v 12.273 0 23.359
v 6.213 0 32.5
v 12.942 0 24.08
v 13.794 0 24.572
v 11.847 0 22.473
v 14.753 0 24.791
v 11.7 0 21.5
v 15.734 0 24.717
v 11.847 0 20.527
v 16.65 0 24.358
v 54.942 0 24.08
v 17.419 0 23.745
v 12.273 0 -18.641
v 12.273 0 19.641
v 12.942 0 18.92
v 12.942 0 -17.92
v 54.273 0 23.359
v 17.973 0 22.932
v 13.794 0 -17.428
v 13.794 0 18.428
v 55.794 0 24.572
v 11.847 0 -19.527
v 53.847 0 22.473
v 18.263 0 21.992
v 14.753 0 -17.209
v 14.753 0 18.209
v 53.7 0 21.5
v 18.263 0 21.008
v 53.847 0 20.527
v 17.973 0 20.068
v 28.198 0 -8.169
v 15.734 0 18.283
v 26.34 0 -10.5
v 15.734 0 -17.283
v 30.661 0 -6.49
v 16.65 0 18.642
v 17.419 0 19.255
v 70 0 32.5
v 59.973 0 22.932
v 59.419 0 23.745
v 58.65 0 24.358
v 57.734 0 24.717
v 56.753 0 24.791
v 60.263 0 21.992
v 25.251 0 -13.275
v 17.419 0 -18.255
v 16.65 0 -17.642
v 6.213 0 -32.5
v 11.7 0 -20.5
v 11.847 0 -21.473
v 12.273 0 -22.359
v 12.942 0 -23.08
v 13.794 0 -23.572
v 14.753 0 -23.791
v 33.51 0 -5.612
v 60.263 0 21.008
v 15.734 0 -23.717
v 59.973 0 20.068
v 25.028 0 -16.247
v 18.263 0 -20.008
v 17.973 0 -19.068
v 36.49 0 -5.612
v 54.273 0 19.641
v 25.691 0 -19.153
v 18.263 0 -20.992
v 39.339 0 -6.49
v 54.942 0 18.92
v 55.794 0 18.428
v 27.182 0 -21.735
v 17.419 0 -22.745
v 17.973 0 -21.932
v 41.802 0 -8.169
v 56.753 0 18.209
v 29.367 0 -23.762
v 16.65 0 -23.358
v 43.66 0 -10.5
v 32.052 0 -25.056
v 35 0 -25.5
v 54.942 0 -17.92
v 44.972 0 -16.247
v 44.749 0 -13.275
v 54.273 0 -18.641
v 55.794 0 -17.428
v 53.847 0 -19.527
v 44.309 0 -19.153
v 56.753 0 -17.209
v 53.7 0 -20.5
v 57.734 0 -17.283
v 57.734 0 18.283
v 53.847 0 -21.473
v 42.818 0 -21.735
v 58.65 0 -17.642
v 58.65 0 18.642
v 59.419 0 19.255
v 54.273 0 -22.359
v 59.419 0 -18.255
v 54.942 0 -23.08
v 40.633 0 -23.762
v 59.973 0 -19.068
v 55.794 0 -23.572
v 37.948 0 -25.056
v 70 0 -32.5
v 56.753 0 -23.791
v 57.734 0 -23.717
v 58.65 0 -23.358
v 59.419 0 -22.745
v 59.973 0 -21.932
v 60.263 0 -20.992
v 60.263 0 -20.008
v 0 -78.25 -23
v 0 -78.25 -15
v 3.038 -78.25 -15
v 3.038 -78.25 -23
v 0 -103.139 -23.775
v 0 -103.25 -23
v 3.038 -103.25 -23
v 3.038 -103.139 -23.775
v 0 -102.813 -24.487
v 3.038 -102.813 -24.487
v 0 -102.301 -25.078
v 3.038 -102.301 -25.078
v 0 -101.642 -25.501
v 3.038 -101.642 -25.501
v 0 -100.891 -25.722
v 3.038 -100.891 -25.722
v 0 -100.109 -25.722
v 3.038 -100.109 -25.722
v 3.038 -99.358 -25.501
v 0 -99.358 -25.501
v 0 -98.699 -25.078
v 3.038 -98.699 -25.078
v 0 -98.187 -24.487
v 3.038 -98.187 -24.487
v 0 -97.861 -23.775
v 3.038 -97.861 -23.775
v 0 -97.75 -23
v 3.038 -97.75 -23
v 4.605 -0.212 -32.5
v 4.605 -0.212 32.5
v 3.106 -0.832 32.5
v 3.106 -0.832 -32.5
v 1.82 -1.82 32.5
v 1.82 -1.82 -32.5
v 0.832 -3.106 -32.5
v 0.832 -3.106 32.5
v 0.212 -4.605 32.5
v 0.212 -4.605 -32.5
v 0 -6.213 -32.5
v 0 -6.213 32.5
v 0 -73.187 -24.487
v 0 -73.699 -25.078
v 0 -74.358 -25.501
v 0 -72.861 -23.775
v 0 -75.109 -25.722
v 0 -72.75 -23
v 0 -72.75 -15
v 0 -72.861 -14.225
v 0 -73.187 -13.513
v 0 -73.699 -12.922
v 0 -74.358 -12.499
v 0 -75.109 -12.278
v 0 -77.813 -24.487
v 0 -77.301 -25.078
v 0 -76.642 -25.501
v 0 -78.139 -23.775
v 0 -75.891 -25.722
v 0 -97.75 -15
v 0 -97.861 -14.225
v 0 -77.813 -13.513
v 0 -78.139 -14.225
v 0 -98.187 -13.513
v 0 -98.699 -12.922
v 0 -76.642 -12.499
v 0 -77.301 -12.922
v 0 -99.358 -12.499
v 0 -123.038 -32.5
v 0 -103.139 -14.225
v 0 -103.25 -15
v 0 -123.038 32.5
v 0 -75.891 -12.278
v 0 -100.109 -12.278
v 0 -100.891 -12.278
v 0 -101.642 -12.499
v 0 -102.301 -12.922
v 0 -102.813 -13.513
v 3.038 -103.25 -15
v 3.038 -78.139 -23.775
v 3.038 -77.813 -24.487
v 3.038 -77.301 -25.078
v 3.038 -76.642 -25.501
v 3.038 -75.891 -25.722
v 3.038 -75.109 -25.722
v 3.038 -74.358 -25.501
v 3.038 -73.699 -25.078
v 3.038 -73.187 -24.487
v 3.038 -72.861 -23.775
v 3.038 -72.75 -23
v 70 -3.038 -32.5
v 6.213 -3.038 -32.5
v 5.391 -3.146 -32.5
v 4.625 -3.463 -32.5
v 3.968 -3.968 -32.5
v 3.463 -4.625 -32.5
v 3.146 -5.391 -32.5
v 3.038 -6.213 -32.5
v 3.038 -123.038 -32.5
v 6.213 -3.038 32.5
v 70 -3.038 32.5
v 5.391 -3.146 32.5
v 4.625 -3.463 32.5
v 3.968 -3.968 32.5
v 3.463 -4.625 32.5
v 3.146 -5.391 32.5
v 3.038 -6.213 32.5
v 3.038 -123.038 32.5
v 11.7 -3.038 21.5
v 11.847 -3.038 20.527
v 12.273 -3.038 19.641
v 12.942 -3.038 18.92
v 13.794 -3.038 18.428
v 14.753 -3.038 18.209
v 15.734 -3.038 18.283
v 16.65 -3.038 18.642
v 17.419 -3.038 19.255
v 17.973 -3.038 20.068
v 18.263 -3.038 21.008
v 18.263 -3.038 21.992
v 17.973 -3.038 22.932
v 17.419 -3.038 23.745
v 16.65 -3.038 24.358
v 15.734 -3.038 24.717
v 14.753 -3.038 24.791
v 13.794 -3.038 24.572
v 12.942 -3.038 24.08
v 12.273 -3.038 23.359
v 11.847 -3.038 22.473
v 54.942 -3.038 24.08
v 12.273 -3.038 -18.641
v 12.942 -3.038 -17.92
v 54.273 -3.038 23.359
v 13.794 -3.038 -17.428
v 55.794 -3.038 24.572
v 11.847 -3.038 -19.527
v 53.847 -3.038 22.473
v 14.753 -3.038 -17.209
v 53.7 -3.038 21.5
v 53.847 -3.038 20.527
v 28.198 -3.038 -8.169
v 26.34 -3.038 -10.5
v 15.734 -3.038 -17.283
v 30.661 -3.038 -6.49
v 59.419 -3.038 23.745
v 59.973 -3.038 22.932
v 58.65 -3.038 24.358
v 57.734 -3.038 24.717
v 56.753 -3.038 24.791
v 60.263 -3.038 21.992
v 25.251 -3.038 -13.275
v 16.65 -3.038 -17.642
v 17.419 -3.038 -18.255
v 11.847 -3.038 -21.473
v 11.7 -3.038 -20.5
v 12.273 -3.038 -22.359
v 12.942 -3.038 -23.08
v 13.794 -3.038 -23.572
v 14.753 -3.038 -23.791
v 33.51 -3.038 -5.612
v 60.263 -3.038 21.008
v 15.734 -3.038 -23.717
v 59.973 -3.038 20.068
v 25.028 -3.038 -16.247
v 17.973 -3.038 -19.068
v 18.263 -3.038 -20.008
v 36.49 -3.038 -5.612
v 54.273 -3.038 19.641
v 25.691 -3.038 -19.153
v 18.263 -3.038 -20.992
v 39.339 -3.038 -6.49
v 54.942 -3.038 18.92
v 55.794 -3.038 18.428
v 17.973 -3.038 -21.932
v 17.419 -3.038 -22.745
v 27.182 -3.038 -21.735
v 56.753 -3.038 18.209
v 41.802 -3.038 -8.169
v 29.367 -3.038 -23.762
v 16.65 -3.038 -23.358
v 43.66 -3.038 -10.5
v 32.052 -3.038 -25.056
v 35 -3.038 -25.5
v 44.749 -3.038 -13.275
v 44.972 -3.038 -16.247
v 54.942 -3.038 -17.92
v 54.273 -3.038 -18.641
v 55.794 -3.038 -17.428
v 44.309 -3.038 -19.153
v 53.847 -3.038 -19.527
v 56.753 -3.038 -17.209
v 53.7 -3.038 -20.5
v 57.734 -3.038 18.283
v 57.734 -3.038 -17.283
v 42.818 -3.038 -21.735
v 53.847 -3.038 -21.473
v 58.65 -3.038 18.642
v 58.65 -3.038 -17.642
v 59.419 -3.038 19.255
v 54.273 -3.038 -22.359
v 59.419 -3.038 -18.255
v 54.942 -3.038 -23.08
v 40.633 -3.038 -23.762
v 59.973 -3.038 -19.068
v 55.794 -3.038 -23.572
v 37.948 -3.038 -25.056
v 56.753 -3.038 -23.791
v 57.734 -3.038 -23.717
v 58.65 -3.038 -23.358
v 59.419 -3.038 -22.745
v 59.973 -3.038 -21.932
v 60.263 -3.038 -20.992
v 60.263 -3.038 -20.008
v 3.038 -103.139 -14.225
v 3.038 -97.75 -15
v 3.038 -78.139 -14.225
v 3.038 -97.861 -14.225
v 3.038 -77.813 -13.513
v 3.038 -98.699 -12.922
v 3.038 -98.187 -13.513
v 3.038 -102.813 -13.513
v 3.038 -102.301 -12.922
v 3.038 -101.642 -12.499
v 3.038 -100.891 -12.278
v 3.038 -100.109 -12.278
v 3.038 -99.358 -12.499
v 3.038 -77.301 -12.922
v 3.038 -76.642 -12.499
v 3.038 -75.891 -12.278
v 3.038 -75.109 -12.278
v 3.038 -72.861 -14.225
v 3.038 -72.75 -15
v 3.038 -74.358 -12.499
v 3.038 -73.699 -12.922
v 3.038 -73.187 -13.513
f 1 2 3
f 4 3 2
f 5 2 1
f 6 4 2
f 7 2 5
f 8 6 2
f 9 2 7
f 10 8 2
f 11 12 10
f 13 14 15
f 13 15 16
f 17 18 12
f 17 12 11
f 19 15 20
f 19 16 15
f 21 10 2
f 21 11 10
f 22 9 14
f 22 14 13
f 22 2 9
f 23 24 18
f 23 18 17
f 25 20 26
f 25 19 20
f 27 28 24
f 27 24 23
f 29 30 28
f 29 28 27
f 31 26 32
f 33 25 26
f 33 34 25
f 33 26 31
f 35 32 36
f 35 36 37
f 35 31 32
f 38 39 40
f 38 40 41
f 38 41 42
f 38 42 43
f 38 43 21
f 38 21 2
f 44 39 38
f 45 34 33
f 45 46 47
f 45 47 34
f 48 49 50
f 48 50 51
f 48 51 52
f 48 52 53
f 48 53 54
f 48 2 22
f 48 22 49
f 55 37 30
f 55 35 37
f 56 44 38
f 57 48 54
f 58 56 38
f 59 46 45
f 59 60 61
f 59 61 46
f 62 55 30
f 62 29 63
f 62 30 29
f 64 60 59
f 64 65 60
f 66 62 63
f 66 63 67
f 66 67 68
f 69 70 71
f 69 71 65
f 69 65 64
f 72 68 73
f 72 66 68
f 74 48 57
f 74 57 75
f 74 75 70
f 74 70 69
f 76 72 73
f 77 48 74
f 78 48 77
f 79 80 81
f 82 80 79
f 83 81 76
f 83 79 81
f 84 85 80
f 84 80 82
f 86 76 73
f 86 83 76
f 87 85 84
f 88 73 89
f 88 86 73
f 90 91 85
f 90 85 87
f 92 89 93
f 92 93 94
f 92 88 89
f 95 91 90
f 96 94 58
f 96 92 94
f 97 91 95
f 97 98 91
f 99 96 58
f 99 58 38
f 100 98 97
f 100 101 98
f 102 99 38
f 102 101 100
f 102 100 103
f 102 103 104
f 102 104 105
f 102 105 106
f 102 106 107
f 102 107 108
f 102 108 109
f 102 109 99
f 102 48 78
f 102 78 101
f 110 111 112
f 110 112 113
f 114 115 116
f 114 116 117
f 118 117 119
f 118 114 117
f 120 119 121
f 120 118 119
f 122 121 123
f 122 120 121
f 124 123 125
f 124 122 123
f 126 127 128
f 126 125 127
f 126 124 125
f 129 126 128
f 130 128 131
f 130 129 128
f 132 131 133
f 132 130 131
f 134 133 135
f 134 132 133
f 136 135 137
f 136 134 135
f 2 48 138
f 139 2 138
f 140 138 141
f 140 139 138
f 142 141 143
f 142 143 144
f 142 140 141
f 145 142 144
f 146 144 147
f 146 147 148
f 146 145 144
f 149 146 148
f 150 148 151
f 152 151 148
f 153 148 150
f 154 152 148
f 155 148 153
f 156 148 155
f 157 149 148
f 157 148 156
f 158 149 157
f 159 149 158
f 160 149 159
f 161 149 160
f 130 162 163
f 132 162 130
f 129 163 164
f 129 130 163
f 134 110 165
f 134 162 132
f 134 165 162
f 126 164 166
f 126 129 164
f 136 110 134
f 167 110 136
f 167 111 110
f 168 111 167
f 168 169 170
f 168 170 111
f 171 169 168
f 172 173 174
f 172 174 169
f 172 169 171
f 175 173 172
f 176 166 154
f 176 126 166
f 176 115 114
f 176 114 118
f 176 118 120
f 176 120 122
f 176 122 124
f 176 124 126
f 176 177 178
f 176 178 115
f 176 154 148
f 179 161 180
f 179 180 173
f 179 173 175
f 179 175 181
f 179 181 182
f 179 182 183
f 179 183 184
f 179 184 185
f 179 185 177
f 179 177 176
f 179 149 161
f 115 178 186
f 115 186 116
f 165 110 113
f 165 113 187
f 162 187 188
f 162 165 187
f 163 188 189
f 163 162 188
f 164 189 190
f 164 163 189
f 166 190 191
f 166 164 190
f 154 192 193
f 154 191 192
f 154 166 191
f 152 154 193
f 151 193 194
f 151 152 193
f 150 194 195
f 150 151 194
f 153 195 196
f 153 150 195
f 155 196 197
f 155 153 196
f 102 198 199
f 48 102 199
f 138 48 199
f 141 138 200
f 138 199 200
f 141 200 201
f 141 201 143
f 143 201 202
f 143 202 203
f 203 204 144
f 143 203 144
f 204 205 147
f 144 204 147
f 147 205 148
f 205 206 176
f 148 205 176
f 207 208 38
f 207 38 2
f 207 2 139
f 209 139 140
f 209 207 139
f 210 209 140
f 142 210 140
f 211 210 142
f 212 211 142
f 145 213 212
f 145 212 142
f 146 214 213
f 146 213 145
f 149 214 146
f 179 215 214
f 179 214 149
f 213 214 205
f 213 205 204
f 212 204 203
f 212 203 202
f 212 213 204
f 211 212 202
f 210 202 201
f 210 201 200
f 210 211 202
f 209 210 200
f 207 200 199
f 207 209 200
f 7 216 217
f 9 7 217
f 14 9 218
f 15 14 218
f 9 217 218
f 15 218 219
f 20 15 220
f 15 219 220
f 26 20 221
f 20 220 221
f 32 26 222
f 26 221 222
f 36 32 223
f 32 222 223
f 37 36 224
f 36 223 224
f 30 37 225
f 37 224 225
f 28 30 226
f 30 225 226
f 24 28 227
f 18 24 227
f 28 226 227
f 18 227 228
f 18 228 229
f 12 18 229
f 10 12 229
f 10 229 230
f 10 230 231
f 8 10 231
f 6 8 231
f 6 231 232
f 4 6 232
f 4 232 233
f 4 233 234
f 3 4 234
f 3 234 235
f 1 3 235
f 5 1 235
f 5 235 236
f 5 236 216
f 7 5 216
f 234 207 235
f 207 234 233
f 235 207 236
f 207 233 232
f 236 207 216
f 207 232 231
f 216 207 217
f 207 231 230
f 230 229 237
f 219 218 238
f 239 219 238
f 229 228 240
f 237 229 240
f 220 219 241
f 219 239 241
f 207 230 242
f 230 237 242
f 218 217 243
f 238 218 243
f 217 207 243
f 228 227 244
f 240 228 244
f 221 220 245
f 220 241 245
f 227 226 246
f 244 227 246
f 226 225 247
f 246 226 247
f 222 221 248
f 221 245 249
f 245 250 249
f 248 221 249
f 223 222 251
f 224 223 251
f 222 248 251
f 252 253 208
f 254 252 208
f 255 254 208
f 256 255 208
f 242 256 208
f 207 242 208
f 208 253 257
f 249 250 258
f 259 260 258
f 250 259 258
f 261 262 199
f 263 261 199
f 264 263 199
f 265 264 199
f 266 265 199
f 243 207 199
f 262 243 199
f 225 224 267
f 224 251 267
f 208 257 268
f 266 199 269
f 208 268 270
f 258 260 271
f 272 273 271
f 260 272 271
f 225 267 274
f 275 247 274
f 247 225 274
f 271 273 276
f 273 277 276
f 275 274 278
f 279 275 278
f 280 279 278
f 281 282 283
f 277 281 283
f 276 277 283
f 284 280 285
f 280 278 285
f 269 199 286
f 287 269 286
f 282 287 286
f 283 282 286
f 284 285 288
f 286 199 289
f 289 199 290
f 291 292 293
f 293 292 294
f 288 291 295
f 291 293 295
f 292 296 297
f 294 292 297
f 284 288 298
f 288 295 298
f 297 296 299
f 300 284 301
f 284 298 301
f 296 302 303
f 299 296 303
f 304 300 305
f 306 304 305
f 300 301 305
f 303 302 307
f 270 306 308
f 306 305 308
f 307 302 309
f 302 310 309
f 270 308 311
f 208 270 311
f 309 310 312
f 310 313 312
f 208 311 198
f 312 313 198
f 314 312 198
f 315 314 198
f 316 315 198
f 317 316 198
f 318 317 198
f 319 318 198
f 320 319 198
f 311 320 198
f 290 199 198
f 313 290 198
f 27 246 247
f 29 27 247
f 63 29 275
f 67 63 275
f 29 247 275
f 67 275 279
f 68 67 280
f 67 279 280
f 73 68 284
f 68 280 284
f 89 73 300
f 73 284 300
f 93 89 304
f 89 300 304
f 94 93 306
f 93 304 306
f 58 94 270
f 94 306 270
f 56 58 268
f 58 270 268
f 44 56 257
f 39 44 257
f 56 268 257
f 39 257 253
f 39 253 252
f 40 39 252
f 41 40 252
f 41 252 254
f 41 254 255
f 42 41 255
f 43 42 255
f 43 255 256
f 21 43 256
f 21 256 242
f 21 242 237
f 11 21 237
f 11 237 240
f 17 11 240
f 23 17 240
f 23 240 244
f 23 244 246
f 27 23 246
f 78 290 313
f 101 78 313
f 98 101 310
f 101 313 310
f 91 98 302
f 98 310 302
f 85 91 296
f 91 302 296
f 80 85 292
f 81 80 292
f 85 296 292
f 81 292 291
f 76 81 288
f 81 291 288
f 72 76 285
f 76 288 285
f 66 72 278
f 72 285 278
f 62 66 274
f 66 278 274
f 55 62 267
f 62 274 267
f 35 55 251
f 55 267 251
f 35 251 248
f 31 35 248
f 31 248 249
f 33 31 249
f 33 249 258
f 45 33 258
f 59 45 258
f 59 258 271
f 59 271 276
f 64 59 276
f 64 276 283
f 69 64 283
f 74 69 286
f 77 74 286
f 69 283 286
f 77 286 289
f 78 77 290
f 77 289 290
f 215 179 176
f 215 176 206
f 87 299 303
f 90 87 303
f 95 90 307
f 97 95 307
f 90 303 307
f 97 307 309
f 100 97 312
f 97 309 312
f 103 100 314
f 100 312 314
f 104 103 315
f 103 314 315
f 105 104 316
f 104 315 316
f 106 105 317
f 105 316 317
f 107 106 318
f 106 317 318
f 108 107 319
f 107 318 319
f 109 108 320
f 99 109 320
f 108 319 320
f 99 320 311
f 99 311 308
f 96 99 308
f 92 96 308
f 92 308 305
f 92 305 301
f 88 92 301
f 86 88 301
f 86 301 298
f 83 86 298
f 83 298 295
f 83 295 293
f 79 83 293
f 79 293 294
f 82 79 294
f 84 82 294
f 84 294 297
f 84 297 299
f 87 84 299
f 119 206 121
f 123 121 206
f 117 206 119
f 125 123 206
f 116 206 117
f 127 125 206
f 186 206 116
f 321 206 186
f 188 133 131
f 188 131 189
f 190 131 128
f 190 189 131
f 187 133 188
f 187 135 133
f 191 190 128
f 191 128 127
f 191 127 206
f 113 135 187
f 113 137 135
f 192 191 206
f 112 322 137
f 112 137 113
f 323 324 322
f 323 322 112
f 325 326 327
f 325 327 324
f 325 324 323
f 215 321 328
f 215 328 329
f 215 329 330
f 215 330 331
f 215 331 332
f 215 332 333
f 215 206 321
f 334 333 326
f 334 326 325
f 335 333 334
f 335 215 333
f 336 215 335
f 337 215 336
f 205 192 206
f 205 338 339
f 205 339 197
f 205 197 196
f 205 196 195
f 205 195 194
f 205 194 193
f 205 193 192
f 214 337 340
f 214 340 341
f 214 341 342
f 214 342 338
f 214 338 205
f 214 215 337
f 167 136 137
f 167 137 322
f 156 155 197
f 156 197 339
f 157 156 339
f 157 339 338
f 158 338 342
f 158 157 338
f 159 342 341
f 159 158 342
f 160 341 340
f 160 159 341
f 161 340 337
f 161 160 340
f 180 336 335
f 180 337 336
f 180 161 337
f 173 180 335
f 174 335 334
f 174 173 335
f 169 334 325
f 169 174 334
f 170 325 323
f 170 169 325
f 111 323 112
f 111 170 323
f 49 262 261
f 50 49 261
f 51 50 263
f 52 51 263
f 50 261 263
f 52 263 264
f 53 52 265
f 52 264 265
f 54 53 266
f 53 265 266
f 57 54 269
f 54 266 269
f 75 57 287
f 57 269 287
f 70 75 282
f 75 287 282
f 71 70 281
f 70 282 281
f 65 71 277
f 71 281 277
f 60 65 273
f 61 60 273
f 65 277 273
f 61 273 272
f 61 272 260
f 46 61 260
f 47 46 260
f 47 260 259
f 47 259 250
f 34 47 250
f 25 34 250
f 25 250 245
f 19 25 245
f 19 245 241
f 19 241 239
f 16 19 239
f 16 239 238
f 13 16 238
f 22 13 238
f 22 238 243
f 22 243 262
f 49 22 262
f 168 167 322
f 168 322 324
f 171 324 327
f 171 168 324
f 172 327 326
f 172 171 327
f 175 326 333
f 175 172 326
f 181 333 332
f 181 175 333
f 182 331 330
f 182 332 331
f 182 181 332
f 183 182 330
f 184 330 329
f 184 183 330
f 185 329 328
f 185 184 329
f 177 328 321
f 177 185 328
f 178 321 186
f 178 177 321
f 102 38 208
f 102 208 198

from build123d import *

# Parameters (mm, degrees)
SKETCH1_W                    = 70
SKETCH1_H                    = 65
BASE_FLANGE1_DEPTH           = 3.03784
EDGE_FLANGE1_STRIP_W         = 18.50136
EDGE_FLANGE1_STRIP_H         = 3.03784
EDGE_FLANGE1_STRIP_CUT_DEPTH = 65
EDGE_FLANGE1_DEPTH           = 65
CUT_EXTRUDE1_DEPTH           = 146.239664251
M6_CLEARANCE_HOLE1_D         = 6.6
SKETCH12_R                   = 10
CUT_EXTRUDE2_DEPTH           = 3.03784


# Sheet-metal steps are written as plain solids
with BuildPart() as part:
    # Sketch1 → Base-Flange1 (new body)
    with BuildSketch(Plane(origin=(0, 0, 0), x_dir=(1, 0, 0), z_dir=(0, 1, 0))):
        with Locations((35, 0)):
            Rectangle(SKETCH1_W, SKETCH1_H)
    extrude(amount=-BASE_FLANGE1_DEPTH)

    # Edge-Flange1 strip (across the edge) → Edge-Flange1 strip cut (cut)
    with BuildSketch(Plane(origin=(0, -3.03784, 32.5), x_dir=(1, 0, 0), z_dir=(0, 0, -1))):
        with Locations((-3.03784, -1.51892)):
            Rectangle(EDGE_FLANGE1_STRIP_W, EDGE_FLANGE1_STRIP_H)
    extrude(amount=EDGE_FLANGE1_STRIP_CUT_DEPTH, mode=Mode.SUBTRACT)

    # Edge-Flange1 section (across the edge) → Edge-Flange1 (add)
    with BuildSketch(Plane(origin=(0, -3.03784, 32.5), x_dir=(1, 0, 0), z_dir=(0, 0, -1))):
        with BuildLine():
            Line((0, 3.175), (0, 120))
            Line((0, 120), (3.03784, 120))
            Line((3.03784, 120), (3.03784, 3.175))
            ThreePointArc((3.03784, 3.175), (3.96777597, 0.92993597), (6.21284, 0))
            Line((6.21284, 0), (6.21284, -3.03784))
            ThreePointArc((6.21284, -3.03784), (1.819698706, -1.218141294), (0, 3.175))
        make_face()
    extrude(amount=EDGE_FLANGE1_DEPTH)

    # Sketch9 → Cut-Extrude1 (cut, through all)
    with BuildSketch(Plane.ZY):
        with BuildLine():
            Line((-23, -72.75), (-15, -72.75))
            ThreePointArc((-15, -72.75), (-12.25, -75.5), (-15, -78.25))
            Line((-15, -78.25), (-23, -78.25))
            ThreePointArc((-23, -78.25), (-25.75, -75.5), (-23, -72.75))
        make_face()
        with BuildLine():
            Line((-23, -97.75), (-15, -97.75))
            ThreePointArc((-15, -97.75), (-12.25, -100.5), (-15, -103.25))
            Line((-15, -103.25), (-23, -103.25))
            ThreePointArc((-23, -103.25), (-25.75, -100.5), (-23, -97.75))
        make_face()
    extrude(amount=-CUT_EXTRUDE1_DEPTH, mode=Mode.SUBTRACT)

    # M6 Clearance Hole1 (through all)
    with Locations(Plane(origin=(0, 0, 0), x_dir=(1, 0, 0), z_dir=(0, 1, 0))):
        with Locations((57, 20.5), (57, -21.5), (15, -21.5), (15, 20.5)):
            Hole(M6_CLEARANCE_HOLE1_D / 2)

    # Sketch12 → Cut-Extrude2 (cut)
    with BuildSketch(Plane.XZ.offset(3.03784)):
        with Locations(Location((35, -15.5, 0), (0, 0, 270))):
            Circle(SKETCH12_R)
    extrude(amount=-CUT_EXTRUDE2_DEPTH, mode=Mode.SUBTRACT)


solid = part.part
